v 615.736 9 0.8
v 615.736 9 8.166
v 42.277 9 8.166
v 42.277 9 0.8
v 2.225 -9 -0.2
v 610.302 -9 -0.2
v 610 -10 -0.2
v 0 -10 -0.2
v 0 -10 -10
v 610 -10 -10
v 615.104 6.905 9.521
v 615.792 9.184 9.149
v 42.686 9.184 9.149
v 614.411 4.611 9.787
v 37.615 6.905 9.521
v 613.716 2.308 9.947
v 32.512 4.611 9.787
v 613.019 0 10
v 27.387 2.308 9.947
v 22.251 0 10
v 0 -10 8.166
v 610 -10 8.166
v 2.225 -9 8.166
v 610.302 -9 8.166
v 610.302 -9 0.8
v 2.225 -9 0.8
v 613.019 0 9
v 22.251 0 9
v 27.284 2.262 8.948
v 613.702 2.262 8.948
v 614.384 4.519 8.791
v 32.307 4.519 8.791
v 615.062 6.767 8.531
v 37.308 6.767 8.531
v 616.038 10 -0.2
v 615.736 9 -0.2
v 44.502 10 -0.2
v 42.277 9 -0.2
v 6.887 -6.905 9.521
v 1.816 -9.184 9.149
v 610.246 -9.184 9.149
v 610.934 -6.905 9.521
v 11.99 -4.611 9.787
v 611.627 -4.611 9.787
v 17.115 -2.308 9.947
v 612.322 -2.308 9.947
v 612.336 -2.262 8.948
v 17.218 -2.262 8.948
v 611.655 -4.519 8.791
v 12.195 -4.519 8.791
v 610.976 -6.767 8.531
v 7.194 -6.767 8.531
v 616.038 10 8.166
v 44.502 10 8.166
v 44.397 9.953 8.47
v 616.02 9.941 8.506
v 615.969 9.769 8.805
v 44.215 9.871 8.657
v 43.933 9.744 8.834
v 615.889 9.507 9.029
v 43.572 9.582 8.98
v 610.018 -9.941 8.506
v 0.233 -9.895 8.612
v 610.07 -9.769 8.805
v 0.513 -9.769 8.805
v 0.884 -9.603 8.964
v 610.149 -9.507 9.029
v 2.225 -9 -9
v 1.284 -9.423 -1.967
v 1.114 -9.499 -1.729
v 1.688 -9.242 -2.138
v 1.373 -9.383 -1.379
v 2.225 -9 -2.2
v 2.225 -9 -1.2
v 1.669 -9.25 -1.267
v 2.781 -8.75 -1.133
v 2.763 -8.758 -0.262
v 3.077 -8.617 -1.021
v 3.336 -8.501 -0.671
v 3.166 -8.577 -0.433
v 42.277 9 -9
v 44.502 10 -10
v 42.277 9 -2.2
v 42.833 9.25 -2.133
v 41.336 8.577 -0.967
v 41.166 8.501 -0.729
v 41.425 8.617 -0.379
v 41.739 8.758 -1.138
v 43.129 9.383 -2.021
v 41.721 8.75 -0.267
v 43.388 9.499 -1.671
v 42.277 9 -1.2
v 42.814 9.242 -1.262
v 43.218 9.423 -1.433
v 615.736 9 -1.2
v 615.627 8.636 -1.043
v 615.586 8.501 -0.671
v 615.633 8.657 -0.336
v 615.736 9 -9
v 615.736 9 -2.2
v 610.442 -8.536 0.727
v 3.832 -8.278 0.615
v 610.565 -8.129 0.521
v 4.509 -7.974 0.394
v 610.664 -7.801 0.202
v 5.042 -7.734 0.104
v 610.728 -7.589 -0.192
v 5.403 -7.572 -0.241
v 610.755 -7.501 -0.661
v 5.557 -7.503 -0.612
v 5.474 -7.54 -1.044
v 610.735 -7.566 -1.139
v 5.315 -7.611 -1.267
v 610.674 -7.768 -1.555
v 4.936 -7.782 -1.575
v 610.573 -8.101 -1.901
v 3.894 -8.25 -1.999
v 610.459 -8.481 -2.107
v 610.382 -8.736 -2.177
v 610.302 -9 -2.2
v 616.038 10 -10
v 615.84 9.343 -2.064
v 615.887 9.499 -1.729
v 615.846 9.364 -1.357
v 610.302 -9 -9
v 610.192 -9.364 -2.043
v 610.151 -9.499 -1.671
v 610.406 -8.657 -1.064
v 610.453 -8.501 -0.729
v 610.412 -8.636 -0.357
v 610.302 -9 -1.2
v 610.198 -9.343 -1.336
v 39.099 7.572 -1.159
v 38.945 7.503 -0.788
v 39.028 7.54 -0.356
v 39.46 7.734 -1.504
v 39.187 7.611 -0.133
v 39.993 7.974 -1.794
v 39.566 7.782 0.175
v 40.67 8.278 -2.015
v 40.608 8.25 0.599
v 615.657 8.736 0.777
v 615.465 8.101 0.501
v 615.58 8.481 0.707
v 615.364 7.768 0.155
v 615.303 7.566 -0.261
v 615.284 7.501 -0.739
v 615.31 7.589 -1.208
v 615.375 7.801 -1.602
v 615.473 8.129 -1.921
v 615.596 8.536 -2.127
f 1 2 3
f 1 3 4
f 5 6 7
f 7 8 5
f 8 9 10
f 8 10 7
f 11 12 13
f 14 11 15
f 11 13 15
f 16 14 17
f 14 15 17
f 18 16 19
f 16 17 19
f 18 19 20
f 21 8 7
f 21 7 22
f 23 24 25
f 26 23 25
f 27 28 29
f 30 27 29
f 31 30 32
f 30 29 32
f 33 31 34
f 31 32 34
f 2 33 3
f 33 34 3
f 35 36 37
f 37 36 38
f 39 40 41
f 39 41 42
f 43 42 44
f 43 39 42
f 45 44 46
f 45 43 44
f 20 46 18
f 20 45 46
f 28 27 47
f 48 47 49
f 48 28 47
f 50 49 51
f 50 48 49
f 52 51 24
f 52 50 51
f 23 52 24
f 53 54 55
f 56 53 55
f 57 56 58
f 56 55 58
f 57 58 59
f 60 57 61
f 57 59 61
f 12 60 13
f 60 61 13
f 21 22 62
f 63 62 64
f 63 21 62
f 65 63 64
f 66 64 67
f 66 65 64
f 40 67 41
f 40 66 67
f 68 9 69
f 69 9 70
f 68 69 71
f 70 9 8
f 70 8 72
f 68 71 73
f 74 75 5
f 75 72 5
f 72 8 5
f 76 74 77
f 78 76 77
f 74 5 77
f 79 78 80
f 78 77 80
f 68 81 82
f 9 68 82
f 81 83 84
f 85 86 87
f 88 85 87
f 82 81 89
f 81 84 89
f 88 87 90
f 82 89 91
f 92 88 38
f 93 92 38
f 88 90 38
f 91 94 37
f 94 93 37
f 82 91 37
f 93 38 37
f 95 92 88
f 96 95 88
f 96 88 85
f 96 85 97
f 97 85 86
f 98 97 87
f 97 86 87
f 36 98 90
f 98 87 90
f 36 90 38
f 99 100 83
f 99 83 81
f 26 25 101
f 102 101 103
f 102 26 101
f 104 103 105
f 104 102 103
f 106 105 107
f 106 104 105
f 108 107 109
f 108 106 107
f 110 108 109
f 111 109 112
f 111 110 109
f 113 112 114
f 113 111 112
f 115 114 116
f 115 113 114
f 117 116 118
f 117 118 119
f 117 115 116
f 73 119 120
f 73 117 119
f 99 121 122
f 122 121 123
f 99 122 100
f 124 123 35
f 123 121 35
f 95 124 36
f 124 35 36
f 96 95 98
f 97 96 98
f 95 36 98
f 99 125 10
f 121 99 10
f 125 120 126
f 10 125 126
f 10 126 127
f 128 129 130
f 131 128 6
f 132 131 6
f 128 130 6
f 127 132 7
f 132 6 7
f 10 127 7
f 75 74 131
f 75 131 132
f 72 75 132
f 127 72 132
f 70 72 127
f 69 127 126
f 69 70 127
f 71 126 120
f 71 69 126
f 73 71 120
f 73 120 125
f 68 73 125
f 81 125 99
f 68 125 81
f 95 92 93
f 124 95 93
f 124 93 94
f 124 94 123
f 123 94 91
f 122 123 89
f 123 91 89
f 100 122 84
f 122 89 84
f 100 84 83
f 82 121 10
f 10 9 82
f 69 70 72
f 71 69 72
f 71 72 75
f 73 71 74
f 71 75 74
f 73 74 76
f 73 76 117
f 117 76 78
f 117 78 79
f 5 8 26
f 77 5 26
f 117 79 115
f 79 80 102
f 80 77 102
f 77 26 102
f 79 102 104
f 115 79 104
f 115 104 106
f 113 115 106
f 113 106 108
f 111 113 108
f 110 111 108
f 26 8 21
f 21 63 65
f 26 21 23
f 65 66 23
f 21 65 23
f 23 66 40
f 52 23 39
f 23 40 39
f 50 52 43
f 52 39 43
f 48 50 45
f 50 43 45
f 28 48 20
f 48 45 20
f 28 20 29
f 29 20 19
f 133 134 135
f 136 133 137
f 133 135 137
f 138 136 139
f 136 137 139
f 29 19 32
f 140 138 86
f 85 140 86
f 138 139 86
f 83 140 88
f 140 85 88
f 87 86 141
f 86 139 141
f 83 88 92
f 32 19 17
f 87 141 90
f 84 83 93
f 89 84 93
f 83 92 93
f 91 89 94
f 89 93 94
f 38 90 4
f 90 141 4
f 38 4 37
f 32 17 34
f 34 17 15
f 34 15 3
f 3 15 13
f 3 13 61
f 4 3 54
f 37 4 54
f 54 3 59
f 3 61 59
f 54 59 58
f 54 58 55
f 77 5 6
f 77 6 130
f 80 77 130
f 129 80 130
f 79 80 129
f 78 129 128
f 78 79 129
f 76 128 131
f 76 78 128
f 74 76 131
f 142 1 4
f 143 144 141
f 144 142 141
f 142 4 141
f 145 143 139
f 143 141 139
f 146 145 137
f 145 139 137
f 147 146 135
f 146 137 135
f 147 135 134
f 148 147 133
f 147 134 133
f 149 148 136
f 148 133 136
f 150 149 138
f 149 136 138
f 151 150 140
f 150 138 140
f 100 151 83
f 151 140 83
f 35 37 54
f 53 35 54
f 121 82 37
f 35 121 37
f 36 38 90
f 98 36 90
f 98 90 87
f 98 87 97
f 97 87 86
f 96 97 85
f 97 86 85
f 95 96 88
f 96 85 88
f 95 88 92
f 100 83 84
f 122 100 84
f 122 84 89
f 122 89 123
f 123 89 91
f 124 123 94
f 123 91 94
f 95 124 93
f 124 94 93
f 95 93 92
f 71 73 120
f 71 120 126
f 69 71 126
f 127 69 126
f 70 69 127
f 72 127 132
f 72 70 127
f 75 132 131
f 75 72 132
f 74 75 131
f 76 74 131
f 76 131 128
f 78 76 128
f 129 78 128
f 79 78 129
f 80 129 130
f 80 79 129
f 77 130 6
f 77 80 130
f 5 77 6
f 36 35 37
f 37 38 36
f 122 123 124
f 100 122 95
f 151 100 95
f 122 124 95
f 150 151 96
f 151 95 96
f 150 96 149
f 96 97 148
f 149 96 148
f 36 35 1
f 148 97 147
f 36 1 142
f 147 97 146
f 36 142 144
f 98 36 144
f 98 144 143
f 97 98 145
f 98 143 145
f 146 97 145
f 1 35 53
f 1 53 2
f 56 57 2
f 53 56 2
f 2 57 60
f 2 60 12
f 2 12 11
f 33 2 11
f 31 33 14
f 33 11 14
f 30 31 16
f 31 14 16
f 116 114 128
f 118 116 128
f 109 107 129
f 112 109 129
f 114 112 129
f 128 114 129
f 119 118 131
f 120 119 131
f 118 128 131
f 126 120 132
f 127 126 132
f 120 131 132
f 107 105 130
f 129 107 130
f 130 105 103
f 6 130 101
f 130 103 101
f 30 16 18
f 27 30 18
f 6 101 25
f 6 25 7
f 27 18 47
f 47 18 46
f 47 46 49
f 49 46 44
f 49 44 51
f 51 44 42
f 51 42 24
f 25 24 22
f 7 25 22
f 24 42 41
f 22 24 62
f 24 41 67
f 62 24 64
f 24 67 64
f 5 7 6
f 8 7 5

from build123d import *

# Parameters (mm, degrees)
F2_DEPTH      = 1200
F4_DEPTH      = 1200
F8_DEPTH      = 10.001
F8_DEPTH_BACK = 10.001


with BuildPart() as f2:
    # F1 (on Right) → F2 (new body)
    with BuildSketch(Plane.YZ):
        with BuildLine():
            Line((0, -9), (0, -10))
            Line((0, -10), (10, -10))
            Line((10, -10), (10, -0.2))
            Line((10, -0.2), (9, -0.2))
            ThreePointArc((9, -0.2), (8.5, -0.7), (9, -1.2))
            ThreePointArc((9, -1.2), (9.5, -1.7), (9, -2.2))
            Line((9, -2.2), (9, -9))
            Line((9, -9), (0, -9))
        make_face()
    extrude(amount=F2_DEPTH)

    # F5: F2 across plane


with BuildPart() as f4:
    # F3 (on Right) → F4 (new body)
    with BuildSketch(Plane.YZ):
        with BuildLine():
            Line((9, -0.2), (10, -0.2))
            Line((10, -0.2), (10, 8.1663783152))
            ThreePointArc((10, 8.1663783152), (9.7693092582, 8.8052548802), (9.1836734694, 9.1493656277))
            ThreePointArc((9.1836734694, 9.1493656277), (4.6114920912, 9.7868872364), (0, 10))
            Line((0, 10), (0, 9))
            ThreePointArc((0, 9), (4.5192622493, 8.7911494917), (9, 8.1663783152))
            Line((9, 8.1663783152), (9, 0.8))
            ThreePointArc((9, 0.8), (7.5, -0.7), (9, -2.2))
            ThreePointArc((9, -2.2), (9.5, -1.7), (9, -1.2))
            ThreePointArc((9, -1.2), (8.5, -0.7), (9, -0.2))
        make_face()
    extrude(amount=F4_DEPTH)

    # F6: F4 across plane


with BuildPart() as f2_1:
    add(f2.part)
    add(f2.part.mirror(Plane.XZ))


with BuildPart() as f4_1:
    add(f4.part)
    add(f4.part.mirror(Plane.XZ))


with BuildPart() as f8_tool:
    # F7 (on Top) → F8 (new body, two sides)
    with BuildSketch(Plane.XY) as f8_sk:
        Polygon((0, 10), (0, 0), (0, -10), (44.5020182264, 10), align=None)
        Polygon((616.0383560074, 10), (610, -10), (1208.0904245377, -10), (1208.0904245377, 10), align=None)
    extrude(amount=F8_DEPTH)
    extrude(f8_sk.sketch, amount=-F8_DEPTH_BACK)


with BuildPart() as f2_2:
    add(f2_1.part)

    # F8: cut by f8_tool
    add(f8_tool.part, mode=Mode.SUBTRACT)


with BuildPart() as f4_2:
    add(f4_1.part)

    # F8: cut by f8_tool
    add(f8_tool.part, mode=Mode.SUBTRACT)


solid = Compound([f2_2.part, f4_2.part])
